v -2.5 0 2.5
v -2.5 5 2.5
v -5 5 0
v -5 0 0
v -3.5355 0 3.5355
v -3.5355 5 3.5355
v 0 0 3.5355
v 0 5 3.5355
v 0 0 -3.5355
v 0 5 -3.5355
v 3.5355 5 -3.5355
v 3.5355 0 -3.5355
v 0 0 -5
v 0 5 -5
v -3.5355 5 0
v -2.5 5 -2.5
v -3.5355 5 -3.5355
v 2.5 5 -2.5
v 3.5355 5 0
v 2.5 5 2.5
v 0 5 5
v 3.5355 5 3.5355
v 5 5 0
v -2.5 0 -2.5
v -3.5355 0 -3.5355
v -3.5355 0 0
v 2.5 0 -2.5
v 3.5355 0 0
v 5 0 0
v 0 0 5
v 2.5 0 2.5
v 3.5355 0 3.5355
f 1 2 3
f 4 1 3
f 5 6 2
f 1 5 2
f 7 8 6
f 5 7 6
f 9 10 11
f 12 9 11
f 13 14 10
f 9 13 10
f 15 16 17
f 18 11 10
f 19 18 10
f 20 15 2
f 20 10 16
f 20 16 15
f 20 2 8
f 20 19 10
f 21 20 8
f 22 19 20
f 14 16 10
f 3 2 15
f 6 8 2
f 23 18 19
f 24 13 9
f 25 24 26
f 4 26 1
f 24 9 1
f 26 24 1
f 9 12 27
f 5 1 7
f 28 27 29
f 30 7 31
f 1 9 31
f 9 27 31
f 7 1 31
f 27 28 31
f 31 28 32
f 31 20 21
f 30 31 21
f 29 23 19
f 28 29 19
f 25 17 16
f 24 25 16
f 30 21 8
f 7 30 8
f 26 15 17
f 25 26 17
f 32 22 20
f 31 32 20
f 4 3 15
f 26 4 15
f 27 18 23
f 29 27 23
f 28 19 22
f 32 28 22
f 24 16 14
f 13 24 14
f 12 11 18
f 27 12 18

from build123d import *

# Parameters (mm, degrees)
SKETCH1_R           = 5
BOSS_EXTRUDE1_DEPTH = 5
CUT_EXTRUDE1_DEPTH  = 9.660254038
CIRPATTERN1_COUNT   = 8


with BuildPart() as part:
    # Sketch1 → Boss-Extrude1 (new body)
    with BuildSketch(Plane(origin=(0, 0, 0), x_dir=(1, 0, 0), z_dir=(0, 1, 0))):
        Circle(SKETCH1_R)
    extrude(amount=BOSS_EXTRUDE1_DEPTH)

    # Sketch2 → Cut-Extrude1 (cut, through all)
    with BuildSketch(Plane(origin=(0, 5, 0), x_dir=(1, 0, 0), z_dir=(0, 1, 0))):
        with BuildLine():
            Line((0, 5), (0, 3.535533906))
            Line((0, 3.535533906), (3.535533906, 3.535533906))
            ThreePointArc((3.535533906, 3.535533906), (1.913417162, 4.619397663), (0, 5))
        make_face()
    cut_extrude1 = extrude(amount=-CUT_EXTRUDE1_DEPTH, mode=Mode.SUBTRACT)

    # CirPattern1: Cut-Extrude1 ×8 about axis
    cirpattern1_axis = Axis((0, 5, 0), (0, 1, 0))
    for i in range(1, CIRPATTERN1_COUNT):
        add(cut_extrude1.rotate(cirpattern1_axis, i * 360 / CIRPATTERN1_COUNT), mode=Mode.SUBTRACT)


solid = part.part
